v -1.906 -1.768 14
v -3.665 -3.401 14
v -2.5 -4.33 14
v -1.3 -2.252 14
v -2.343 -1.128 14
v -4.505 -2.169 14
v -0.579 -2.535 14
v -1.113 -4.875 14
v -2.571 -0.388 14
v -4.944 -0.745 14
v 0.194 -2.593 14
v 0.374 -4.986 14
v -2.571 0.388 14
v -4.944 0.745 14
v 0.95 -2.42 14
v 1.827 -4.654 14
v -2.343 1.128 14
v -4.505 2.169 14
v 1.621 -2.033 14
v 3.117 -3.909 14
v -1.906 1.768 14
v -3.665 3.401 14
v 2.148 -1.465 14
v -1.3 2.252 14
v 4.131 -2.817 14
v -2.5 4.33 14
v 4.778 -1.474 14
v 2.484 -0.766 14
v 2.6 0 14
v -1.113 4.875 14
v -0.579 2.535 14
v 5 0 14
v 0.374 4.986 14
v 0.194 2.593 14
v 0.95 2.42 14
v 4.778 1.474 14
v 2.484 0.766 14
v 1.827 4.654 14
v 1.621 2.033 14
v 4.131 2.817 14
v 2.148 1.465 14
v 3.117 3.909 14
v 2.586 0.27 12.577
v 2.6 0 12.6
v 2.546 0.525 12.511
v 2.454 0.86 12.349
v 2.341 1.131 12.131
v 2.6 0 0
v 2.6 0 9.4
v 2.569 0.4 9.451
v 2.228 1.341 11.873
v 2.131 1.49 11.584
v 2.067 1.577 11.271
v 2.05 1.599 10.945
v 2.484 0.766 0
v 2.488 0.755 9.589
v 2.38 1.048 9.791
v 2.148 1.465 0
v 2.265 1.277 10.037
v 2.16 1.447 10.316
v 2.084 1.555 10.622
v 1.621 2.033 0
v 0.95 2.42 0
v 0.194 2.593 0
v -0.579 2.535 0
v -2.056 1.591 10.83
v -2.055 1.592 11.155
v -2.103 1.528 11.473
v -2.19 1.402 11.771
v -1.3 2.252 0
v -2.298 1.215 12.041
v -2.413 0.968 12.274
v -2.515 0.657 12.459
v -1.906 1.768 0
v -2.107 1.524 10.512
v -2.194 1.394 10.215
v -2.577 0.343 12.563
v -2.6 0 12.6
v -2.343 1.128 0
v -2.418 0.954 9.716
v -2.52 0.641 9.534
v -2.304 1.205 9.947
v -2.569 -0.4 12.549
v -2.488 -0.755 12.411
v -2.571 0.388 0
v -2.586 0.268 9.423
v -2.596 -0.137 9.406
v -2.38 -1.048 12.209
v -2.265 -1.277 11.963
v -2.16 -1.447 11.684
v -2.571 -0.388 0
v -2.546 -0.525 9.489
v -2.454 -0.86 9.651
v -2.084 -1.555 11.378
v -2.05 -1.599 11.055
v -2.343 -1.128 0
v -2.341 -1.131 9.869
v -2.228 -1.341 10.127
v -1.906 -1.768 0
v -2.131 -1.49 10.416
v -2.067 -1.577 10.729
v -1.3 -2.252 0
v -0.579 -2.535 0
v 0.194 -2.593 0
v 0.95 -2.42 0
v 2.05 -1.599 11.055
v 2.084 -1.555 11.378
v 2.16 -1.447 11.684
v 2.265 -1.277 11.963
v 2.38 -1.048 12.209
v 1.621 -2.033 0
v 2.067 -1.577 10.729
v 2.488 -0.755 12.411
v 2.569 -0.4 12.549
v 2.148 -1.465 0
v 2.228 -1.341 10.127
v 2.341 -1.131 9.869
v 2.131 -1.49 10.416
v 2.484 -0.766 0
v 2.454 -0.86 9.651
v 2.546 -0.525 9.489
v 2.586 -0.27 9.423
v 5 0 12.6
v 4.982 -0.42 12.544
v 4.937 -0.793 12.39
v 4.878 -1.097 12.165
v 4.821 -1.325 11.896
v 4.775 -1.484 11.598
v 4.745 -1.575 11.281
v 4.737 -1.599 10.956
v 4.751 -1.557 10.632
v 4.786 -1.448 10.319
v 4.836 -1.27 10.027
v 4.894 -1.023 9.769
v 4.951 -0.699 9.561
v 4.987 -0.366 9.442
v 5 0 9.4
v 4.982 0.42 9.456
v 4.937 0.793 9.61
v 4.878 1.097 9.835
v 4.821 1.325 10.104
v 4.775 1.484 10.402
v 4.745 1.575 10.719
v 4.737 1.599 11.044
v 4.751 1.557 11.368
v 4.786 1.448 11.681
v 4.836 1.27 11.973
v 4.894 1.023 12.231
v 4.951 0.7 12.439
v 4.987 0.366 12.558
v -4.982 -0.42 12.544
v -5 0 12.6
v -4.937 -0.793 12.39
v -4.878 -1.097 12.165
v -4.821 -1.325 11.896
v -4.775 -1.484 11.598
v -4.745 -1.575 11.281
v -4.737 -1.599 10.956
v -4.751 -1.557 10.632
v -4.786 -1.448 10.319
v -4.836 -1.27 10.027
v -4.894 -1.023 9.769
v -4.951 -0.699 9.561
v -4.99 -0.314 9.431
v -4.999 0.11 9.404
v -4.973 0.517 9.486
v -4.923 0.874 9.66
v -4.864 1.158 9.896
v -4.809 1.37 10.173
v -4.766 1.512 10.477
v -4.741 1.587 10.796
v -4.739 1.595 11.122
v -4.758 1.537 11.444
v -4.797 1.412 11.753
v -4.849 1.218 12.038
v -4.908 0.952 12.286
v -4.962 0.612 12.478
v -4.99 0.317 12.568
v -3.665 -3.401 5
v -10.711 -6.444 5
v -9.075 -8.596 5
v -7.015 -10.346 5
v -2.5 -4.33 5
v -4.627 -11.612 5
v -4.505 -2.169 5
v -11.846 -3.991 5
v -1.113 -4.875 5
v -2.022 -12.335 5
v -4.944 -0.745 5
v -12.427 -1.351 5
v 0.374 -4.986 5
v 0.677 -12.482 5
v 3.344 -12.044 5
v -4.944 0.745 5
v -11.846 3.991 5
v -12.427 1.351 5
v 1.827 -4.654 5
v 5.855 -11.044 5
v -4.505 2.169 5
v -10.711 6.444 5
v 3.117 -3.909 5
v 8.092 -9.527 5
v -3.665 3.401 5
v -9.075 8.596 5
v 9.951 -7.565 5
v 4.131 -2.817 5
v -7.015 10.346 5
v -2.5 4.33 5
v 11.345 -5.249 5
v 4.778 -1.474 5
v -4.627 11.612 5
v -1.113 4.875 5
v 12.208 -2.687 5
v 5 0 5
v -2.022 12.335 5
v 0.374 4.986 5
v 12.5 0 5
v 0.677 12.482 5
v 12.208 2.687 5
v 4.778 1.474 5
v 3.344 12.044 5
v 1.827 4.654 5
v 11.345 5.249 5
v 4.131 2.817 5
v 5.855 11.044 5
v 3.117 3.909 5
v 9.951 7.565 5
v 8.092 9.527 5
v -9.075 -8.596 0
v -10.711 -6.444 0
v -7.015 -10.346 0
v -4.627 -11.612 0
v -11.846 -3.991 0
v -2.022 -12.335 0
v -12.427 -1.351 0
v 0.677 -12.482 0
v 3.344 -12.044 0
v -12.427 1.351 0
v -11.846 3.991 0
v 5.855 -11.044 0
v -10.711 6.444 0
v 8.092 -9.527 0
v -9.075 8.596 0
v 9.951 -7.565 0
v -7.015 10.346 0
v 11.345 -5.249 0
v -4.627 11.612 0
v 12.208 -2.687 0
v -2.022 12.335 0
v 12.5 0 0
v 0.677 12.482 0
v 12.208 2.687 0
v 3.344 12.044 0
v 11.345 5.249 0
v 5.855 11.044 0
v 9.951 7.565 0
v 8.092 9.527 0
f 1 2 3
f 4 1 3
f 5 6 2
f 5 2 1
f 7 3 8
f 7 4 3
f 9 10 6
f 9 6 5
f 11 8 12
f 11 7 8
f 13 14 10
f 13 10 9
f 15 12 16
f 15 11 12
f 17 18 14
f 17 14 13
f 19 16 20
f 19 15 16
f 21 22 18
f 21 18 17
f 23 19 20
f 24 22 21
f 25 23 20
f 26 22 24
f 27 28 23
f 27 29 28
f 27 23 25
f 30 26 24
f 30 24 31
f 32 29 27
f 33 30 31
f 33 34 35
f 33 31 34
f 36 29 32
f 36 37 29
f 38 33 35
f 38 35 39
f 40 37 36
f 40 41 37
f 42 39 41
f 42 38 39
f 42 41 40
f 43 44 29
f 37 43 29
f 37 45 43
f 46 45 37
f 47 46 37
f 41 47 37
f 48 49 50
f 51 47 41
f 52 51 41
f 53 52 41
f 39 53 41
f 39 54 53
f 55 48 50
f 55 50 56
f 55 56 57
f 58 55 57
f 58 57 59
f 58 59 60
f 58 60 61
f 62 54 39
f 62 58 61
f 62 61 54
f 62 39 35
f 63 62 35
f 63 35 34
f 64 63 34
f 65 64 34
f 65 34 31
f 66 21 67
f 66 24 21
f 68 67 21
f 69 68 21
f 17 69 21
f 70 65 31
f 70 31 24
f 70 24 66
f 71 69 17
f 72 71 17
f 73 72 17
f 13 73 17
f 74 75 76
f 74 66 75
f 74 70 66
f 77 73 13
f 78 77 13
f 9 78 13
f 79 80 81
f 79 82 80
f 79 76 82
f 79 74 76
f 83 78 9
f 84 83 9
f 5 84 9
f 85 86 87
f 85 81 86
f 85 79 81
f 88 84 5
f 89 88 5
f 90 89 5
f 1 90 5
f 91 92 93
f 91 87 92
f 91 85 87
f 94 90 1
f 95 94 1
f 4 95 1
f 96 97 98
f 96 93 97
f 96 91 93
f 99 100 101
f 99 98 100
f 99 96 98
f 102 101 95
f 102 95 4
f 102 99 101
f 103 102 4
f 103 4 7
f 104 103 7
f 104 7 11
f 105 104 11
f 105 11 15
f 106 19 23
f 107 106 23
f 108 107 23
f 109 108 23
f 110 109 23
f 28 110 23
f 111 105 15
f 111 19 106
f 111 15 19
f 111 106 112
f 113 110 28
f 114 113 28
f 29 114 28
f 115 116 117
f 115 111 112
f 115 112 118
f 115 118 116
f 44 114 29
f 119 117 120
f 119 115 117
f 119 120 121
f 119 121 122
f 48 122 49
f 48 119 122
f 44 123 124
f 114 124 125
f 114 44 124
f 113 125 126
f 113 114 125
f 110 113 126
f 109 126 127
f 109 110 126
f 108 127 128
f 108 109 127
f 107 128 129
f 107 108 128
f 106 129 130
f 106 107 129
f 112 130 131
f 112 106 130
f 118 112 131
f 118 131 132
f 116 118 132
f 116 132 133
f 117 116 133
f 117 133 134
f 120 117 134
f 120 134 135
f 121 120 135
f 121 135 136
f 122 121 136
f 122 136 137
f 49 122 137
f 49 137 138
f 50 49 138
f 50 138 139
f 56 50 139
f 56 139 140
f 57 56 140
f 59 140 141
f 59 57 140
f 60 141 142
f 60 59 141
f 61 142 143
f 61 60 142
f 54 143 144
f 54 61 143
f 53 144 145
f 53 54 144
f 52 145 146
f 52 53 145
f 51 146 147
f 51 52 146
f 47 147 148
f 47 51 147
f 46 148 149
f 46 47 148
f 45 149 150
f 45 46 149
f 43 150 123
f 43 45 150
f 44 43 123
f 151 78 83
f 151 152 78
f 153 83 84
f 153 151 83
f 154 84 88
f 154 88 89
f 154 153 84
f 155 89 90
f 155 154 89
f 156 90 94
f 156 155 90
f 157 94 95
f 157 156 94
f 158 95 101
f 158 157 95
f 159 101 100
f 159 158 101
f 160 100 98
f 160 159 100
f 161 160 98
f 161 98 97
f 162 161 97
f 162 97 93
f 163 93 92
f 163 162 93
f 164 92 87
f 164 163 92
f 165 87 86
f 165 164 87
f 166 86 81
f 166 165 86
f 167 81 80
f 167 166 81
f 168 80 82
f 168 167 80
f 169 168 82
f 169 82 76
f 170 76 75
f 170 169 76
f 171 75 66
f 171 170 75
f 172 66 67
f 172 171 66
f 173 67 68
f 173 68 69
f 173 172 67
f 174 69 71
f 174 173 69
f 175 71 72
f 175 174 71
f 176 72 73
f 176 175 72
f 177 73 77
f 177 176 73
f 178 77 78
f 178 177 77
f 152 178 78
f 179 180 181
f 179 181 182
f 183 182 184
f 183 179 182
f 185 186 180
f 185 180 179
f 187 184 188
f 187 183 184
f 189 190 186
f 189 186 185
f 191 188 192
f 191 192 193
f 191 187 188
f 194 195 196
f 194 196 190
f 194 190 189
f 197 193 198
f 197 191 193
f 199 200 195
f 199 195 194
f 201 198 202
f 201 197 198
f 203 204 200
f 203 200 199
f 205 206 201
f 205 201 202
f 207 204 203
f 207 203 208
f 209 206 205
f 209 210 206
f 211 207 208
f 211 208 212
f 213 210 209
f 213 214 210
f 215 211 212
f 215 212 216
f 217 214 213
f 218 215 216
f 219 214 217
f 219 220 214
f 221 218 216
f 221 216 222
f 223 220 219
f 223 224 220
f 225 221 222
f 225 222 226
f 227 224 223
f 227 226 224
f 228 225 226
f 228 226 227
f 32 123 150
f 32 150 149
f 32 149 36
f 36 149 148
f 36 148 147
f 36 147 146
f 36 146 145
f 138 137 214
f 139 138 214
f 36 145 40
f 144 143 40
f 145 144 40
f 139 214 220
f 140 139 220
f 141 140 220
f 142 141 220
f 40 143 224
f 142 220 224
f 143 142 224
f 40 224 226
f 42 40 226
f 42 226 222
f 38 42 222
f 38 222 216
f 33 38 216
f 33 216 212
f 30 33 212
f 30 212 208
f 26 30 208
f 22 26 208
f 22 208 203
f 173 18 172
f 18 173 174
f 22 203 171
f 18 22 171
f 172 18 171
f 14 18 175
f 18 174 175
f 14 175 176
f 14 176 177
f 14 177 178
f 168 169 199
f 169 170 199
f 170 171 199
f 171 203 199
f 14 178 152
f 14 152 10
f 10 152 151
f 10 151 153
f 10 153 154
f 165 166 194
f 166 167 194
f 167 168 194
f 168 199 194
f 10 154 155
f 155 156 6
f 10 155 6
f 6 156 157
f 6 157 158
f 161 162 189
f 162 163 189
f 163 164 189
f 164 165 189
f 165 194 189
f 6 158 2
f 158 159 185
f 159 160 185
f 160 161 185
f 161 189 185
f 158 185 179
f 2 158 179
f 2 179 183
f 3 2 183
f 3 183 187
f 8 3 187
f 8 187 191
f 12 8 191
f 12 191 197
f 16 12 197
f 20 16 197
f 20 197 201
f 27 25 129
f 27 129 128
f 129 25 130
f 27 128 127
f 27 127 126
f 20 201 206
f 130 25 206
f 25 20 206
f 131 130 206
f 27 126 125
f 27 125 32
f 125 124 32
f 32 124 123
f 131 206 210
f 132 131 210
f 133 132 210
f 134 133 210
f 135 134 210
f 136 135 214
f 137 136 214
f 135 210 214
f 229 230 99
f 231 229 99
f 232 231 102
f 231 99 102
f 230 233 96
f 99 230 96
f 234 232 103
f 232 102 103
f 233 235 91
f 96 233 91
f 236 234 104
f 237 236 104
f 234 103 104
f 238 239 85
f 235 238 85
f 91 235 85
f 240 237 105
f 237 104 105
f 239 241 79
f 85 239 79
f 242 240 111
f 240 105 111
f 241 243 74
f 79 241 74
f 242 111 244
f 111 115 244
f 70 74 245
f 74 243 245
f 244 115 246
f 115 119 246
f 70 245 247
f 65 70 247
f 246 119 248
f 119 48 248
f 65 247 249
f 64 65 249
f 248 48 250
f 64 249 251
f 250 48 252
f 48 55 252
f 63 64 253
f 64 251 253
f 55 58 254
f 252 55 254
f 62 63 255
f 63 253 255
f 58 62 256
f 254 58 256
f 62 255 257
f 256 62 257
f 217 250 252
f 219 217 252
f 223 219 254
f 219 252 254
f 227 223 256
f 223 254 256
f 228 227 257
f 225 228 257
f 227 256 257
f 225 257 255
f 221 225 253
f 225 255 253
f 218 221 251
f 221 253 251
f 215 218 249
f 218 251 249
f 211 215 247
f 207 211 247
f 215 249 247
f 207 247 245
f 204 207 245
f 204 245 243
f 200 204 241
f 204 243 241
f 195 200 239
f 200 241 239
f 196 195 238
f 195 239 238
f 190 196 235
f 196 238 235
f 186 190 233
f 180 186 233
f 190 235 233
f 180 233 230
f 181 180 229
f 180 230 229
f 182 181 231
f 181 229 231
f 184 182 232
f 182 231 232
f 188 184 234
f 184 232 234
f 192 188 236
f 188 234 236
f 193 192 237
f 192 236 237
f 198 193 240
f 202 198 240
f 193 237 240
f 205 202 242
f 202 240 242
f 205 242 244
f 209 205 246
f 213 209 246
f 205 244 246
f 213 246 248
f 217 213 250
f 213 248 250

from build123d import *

# Parameters (mm, degrees)
SKETCH_1_R               = 12.5
SKETCH_1_R_2             = 2.6
EXTRUDE_1_DEPTH          = 5
SKETCH_1_4_R             = 5
SKETCH_1_4_R_2           = 2.6
EXTRUDE_2_DEPTH          = 14
CUT_EXTRUDE_1_DEPTH      = 10
CUT_EXTRUDE_1_DEPTH_BACK = 10
SKETCH_2_R               = 1.6


with BuildPart() as part:
    # 草图1 → 凸台-拉伸1 (new body)
    with BuildSketch(Plane.XY):
        Circle(SKETCH_1_R)
        Circle(SKETCH_1_R_2, mode=Mode.SUBTRACT)
    extrude(amount=EXTRUDE_1_DEPTH)

    # 草图1<4> → 凸台-拉伸2 (add)
    with BuildSketch(Plane.XY):
        Circle(SKETCH_1_4_R)
        Circle(SKETCH_1_4_R_2, mode=Mode.SUBTRACT)
    extrude(amount=EXTRUDE_2_DEPTH)

    # 草图2 → 切除-拉伸1 (cut, two sides: drawn at the far end of the back side and taken through both)
    with BuildSketch(Plane(origin=(0, 0, 0), x_dir=(0, 0, -1), z_dir=(1, 0, 0)).offset(-CUT_EXTRUDE_1_DEPTH_BACK)):
        with Locations(Location((-11, 0, 0), (0, 0, 180))):
            Circle(SKETCH_2_R)
    extrude(amount=CUT_EXTRUDE_1_DEPTH + CUT_EXTRUDE_1_DEPTH_BACK, mode=Mode.SUBTRACT)


solid = part.part
